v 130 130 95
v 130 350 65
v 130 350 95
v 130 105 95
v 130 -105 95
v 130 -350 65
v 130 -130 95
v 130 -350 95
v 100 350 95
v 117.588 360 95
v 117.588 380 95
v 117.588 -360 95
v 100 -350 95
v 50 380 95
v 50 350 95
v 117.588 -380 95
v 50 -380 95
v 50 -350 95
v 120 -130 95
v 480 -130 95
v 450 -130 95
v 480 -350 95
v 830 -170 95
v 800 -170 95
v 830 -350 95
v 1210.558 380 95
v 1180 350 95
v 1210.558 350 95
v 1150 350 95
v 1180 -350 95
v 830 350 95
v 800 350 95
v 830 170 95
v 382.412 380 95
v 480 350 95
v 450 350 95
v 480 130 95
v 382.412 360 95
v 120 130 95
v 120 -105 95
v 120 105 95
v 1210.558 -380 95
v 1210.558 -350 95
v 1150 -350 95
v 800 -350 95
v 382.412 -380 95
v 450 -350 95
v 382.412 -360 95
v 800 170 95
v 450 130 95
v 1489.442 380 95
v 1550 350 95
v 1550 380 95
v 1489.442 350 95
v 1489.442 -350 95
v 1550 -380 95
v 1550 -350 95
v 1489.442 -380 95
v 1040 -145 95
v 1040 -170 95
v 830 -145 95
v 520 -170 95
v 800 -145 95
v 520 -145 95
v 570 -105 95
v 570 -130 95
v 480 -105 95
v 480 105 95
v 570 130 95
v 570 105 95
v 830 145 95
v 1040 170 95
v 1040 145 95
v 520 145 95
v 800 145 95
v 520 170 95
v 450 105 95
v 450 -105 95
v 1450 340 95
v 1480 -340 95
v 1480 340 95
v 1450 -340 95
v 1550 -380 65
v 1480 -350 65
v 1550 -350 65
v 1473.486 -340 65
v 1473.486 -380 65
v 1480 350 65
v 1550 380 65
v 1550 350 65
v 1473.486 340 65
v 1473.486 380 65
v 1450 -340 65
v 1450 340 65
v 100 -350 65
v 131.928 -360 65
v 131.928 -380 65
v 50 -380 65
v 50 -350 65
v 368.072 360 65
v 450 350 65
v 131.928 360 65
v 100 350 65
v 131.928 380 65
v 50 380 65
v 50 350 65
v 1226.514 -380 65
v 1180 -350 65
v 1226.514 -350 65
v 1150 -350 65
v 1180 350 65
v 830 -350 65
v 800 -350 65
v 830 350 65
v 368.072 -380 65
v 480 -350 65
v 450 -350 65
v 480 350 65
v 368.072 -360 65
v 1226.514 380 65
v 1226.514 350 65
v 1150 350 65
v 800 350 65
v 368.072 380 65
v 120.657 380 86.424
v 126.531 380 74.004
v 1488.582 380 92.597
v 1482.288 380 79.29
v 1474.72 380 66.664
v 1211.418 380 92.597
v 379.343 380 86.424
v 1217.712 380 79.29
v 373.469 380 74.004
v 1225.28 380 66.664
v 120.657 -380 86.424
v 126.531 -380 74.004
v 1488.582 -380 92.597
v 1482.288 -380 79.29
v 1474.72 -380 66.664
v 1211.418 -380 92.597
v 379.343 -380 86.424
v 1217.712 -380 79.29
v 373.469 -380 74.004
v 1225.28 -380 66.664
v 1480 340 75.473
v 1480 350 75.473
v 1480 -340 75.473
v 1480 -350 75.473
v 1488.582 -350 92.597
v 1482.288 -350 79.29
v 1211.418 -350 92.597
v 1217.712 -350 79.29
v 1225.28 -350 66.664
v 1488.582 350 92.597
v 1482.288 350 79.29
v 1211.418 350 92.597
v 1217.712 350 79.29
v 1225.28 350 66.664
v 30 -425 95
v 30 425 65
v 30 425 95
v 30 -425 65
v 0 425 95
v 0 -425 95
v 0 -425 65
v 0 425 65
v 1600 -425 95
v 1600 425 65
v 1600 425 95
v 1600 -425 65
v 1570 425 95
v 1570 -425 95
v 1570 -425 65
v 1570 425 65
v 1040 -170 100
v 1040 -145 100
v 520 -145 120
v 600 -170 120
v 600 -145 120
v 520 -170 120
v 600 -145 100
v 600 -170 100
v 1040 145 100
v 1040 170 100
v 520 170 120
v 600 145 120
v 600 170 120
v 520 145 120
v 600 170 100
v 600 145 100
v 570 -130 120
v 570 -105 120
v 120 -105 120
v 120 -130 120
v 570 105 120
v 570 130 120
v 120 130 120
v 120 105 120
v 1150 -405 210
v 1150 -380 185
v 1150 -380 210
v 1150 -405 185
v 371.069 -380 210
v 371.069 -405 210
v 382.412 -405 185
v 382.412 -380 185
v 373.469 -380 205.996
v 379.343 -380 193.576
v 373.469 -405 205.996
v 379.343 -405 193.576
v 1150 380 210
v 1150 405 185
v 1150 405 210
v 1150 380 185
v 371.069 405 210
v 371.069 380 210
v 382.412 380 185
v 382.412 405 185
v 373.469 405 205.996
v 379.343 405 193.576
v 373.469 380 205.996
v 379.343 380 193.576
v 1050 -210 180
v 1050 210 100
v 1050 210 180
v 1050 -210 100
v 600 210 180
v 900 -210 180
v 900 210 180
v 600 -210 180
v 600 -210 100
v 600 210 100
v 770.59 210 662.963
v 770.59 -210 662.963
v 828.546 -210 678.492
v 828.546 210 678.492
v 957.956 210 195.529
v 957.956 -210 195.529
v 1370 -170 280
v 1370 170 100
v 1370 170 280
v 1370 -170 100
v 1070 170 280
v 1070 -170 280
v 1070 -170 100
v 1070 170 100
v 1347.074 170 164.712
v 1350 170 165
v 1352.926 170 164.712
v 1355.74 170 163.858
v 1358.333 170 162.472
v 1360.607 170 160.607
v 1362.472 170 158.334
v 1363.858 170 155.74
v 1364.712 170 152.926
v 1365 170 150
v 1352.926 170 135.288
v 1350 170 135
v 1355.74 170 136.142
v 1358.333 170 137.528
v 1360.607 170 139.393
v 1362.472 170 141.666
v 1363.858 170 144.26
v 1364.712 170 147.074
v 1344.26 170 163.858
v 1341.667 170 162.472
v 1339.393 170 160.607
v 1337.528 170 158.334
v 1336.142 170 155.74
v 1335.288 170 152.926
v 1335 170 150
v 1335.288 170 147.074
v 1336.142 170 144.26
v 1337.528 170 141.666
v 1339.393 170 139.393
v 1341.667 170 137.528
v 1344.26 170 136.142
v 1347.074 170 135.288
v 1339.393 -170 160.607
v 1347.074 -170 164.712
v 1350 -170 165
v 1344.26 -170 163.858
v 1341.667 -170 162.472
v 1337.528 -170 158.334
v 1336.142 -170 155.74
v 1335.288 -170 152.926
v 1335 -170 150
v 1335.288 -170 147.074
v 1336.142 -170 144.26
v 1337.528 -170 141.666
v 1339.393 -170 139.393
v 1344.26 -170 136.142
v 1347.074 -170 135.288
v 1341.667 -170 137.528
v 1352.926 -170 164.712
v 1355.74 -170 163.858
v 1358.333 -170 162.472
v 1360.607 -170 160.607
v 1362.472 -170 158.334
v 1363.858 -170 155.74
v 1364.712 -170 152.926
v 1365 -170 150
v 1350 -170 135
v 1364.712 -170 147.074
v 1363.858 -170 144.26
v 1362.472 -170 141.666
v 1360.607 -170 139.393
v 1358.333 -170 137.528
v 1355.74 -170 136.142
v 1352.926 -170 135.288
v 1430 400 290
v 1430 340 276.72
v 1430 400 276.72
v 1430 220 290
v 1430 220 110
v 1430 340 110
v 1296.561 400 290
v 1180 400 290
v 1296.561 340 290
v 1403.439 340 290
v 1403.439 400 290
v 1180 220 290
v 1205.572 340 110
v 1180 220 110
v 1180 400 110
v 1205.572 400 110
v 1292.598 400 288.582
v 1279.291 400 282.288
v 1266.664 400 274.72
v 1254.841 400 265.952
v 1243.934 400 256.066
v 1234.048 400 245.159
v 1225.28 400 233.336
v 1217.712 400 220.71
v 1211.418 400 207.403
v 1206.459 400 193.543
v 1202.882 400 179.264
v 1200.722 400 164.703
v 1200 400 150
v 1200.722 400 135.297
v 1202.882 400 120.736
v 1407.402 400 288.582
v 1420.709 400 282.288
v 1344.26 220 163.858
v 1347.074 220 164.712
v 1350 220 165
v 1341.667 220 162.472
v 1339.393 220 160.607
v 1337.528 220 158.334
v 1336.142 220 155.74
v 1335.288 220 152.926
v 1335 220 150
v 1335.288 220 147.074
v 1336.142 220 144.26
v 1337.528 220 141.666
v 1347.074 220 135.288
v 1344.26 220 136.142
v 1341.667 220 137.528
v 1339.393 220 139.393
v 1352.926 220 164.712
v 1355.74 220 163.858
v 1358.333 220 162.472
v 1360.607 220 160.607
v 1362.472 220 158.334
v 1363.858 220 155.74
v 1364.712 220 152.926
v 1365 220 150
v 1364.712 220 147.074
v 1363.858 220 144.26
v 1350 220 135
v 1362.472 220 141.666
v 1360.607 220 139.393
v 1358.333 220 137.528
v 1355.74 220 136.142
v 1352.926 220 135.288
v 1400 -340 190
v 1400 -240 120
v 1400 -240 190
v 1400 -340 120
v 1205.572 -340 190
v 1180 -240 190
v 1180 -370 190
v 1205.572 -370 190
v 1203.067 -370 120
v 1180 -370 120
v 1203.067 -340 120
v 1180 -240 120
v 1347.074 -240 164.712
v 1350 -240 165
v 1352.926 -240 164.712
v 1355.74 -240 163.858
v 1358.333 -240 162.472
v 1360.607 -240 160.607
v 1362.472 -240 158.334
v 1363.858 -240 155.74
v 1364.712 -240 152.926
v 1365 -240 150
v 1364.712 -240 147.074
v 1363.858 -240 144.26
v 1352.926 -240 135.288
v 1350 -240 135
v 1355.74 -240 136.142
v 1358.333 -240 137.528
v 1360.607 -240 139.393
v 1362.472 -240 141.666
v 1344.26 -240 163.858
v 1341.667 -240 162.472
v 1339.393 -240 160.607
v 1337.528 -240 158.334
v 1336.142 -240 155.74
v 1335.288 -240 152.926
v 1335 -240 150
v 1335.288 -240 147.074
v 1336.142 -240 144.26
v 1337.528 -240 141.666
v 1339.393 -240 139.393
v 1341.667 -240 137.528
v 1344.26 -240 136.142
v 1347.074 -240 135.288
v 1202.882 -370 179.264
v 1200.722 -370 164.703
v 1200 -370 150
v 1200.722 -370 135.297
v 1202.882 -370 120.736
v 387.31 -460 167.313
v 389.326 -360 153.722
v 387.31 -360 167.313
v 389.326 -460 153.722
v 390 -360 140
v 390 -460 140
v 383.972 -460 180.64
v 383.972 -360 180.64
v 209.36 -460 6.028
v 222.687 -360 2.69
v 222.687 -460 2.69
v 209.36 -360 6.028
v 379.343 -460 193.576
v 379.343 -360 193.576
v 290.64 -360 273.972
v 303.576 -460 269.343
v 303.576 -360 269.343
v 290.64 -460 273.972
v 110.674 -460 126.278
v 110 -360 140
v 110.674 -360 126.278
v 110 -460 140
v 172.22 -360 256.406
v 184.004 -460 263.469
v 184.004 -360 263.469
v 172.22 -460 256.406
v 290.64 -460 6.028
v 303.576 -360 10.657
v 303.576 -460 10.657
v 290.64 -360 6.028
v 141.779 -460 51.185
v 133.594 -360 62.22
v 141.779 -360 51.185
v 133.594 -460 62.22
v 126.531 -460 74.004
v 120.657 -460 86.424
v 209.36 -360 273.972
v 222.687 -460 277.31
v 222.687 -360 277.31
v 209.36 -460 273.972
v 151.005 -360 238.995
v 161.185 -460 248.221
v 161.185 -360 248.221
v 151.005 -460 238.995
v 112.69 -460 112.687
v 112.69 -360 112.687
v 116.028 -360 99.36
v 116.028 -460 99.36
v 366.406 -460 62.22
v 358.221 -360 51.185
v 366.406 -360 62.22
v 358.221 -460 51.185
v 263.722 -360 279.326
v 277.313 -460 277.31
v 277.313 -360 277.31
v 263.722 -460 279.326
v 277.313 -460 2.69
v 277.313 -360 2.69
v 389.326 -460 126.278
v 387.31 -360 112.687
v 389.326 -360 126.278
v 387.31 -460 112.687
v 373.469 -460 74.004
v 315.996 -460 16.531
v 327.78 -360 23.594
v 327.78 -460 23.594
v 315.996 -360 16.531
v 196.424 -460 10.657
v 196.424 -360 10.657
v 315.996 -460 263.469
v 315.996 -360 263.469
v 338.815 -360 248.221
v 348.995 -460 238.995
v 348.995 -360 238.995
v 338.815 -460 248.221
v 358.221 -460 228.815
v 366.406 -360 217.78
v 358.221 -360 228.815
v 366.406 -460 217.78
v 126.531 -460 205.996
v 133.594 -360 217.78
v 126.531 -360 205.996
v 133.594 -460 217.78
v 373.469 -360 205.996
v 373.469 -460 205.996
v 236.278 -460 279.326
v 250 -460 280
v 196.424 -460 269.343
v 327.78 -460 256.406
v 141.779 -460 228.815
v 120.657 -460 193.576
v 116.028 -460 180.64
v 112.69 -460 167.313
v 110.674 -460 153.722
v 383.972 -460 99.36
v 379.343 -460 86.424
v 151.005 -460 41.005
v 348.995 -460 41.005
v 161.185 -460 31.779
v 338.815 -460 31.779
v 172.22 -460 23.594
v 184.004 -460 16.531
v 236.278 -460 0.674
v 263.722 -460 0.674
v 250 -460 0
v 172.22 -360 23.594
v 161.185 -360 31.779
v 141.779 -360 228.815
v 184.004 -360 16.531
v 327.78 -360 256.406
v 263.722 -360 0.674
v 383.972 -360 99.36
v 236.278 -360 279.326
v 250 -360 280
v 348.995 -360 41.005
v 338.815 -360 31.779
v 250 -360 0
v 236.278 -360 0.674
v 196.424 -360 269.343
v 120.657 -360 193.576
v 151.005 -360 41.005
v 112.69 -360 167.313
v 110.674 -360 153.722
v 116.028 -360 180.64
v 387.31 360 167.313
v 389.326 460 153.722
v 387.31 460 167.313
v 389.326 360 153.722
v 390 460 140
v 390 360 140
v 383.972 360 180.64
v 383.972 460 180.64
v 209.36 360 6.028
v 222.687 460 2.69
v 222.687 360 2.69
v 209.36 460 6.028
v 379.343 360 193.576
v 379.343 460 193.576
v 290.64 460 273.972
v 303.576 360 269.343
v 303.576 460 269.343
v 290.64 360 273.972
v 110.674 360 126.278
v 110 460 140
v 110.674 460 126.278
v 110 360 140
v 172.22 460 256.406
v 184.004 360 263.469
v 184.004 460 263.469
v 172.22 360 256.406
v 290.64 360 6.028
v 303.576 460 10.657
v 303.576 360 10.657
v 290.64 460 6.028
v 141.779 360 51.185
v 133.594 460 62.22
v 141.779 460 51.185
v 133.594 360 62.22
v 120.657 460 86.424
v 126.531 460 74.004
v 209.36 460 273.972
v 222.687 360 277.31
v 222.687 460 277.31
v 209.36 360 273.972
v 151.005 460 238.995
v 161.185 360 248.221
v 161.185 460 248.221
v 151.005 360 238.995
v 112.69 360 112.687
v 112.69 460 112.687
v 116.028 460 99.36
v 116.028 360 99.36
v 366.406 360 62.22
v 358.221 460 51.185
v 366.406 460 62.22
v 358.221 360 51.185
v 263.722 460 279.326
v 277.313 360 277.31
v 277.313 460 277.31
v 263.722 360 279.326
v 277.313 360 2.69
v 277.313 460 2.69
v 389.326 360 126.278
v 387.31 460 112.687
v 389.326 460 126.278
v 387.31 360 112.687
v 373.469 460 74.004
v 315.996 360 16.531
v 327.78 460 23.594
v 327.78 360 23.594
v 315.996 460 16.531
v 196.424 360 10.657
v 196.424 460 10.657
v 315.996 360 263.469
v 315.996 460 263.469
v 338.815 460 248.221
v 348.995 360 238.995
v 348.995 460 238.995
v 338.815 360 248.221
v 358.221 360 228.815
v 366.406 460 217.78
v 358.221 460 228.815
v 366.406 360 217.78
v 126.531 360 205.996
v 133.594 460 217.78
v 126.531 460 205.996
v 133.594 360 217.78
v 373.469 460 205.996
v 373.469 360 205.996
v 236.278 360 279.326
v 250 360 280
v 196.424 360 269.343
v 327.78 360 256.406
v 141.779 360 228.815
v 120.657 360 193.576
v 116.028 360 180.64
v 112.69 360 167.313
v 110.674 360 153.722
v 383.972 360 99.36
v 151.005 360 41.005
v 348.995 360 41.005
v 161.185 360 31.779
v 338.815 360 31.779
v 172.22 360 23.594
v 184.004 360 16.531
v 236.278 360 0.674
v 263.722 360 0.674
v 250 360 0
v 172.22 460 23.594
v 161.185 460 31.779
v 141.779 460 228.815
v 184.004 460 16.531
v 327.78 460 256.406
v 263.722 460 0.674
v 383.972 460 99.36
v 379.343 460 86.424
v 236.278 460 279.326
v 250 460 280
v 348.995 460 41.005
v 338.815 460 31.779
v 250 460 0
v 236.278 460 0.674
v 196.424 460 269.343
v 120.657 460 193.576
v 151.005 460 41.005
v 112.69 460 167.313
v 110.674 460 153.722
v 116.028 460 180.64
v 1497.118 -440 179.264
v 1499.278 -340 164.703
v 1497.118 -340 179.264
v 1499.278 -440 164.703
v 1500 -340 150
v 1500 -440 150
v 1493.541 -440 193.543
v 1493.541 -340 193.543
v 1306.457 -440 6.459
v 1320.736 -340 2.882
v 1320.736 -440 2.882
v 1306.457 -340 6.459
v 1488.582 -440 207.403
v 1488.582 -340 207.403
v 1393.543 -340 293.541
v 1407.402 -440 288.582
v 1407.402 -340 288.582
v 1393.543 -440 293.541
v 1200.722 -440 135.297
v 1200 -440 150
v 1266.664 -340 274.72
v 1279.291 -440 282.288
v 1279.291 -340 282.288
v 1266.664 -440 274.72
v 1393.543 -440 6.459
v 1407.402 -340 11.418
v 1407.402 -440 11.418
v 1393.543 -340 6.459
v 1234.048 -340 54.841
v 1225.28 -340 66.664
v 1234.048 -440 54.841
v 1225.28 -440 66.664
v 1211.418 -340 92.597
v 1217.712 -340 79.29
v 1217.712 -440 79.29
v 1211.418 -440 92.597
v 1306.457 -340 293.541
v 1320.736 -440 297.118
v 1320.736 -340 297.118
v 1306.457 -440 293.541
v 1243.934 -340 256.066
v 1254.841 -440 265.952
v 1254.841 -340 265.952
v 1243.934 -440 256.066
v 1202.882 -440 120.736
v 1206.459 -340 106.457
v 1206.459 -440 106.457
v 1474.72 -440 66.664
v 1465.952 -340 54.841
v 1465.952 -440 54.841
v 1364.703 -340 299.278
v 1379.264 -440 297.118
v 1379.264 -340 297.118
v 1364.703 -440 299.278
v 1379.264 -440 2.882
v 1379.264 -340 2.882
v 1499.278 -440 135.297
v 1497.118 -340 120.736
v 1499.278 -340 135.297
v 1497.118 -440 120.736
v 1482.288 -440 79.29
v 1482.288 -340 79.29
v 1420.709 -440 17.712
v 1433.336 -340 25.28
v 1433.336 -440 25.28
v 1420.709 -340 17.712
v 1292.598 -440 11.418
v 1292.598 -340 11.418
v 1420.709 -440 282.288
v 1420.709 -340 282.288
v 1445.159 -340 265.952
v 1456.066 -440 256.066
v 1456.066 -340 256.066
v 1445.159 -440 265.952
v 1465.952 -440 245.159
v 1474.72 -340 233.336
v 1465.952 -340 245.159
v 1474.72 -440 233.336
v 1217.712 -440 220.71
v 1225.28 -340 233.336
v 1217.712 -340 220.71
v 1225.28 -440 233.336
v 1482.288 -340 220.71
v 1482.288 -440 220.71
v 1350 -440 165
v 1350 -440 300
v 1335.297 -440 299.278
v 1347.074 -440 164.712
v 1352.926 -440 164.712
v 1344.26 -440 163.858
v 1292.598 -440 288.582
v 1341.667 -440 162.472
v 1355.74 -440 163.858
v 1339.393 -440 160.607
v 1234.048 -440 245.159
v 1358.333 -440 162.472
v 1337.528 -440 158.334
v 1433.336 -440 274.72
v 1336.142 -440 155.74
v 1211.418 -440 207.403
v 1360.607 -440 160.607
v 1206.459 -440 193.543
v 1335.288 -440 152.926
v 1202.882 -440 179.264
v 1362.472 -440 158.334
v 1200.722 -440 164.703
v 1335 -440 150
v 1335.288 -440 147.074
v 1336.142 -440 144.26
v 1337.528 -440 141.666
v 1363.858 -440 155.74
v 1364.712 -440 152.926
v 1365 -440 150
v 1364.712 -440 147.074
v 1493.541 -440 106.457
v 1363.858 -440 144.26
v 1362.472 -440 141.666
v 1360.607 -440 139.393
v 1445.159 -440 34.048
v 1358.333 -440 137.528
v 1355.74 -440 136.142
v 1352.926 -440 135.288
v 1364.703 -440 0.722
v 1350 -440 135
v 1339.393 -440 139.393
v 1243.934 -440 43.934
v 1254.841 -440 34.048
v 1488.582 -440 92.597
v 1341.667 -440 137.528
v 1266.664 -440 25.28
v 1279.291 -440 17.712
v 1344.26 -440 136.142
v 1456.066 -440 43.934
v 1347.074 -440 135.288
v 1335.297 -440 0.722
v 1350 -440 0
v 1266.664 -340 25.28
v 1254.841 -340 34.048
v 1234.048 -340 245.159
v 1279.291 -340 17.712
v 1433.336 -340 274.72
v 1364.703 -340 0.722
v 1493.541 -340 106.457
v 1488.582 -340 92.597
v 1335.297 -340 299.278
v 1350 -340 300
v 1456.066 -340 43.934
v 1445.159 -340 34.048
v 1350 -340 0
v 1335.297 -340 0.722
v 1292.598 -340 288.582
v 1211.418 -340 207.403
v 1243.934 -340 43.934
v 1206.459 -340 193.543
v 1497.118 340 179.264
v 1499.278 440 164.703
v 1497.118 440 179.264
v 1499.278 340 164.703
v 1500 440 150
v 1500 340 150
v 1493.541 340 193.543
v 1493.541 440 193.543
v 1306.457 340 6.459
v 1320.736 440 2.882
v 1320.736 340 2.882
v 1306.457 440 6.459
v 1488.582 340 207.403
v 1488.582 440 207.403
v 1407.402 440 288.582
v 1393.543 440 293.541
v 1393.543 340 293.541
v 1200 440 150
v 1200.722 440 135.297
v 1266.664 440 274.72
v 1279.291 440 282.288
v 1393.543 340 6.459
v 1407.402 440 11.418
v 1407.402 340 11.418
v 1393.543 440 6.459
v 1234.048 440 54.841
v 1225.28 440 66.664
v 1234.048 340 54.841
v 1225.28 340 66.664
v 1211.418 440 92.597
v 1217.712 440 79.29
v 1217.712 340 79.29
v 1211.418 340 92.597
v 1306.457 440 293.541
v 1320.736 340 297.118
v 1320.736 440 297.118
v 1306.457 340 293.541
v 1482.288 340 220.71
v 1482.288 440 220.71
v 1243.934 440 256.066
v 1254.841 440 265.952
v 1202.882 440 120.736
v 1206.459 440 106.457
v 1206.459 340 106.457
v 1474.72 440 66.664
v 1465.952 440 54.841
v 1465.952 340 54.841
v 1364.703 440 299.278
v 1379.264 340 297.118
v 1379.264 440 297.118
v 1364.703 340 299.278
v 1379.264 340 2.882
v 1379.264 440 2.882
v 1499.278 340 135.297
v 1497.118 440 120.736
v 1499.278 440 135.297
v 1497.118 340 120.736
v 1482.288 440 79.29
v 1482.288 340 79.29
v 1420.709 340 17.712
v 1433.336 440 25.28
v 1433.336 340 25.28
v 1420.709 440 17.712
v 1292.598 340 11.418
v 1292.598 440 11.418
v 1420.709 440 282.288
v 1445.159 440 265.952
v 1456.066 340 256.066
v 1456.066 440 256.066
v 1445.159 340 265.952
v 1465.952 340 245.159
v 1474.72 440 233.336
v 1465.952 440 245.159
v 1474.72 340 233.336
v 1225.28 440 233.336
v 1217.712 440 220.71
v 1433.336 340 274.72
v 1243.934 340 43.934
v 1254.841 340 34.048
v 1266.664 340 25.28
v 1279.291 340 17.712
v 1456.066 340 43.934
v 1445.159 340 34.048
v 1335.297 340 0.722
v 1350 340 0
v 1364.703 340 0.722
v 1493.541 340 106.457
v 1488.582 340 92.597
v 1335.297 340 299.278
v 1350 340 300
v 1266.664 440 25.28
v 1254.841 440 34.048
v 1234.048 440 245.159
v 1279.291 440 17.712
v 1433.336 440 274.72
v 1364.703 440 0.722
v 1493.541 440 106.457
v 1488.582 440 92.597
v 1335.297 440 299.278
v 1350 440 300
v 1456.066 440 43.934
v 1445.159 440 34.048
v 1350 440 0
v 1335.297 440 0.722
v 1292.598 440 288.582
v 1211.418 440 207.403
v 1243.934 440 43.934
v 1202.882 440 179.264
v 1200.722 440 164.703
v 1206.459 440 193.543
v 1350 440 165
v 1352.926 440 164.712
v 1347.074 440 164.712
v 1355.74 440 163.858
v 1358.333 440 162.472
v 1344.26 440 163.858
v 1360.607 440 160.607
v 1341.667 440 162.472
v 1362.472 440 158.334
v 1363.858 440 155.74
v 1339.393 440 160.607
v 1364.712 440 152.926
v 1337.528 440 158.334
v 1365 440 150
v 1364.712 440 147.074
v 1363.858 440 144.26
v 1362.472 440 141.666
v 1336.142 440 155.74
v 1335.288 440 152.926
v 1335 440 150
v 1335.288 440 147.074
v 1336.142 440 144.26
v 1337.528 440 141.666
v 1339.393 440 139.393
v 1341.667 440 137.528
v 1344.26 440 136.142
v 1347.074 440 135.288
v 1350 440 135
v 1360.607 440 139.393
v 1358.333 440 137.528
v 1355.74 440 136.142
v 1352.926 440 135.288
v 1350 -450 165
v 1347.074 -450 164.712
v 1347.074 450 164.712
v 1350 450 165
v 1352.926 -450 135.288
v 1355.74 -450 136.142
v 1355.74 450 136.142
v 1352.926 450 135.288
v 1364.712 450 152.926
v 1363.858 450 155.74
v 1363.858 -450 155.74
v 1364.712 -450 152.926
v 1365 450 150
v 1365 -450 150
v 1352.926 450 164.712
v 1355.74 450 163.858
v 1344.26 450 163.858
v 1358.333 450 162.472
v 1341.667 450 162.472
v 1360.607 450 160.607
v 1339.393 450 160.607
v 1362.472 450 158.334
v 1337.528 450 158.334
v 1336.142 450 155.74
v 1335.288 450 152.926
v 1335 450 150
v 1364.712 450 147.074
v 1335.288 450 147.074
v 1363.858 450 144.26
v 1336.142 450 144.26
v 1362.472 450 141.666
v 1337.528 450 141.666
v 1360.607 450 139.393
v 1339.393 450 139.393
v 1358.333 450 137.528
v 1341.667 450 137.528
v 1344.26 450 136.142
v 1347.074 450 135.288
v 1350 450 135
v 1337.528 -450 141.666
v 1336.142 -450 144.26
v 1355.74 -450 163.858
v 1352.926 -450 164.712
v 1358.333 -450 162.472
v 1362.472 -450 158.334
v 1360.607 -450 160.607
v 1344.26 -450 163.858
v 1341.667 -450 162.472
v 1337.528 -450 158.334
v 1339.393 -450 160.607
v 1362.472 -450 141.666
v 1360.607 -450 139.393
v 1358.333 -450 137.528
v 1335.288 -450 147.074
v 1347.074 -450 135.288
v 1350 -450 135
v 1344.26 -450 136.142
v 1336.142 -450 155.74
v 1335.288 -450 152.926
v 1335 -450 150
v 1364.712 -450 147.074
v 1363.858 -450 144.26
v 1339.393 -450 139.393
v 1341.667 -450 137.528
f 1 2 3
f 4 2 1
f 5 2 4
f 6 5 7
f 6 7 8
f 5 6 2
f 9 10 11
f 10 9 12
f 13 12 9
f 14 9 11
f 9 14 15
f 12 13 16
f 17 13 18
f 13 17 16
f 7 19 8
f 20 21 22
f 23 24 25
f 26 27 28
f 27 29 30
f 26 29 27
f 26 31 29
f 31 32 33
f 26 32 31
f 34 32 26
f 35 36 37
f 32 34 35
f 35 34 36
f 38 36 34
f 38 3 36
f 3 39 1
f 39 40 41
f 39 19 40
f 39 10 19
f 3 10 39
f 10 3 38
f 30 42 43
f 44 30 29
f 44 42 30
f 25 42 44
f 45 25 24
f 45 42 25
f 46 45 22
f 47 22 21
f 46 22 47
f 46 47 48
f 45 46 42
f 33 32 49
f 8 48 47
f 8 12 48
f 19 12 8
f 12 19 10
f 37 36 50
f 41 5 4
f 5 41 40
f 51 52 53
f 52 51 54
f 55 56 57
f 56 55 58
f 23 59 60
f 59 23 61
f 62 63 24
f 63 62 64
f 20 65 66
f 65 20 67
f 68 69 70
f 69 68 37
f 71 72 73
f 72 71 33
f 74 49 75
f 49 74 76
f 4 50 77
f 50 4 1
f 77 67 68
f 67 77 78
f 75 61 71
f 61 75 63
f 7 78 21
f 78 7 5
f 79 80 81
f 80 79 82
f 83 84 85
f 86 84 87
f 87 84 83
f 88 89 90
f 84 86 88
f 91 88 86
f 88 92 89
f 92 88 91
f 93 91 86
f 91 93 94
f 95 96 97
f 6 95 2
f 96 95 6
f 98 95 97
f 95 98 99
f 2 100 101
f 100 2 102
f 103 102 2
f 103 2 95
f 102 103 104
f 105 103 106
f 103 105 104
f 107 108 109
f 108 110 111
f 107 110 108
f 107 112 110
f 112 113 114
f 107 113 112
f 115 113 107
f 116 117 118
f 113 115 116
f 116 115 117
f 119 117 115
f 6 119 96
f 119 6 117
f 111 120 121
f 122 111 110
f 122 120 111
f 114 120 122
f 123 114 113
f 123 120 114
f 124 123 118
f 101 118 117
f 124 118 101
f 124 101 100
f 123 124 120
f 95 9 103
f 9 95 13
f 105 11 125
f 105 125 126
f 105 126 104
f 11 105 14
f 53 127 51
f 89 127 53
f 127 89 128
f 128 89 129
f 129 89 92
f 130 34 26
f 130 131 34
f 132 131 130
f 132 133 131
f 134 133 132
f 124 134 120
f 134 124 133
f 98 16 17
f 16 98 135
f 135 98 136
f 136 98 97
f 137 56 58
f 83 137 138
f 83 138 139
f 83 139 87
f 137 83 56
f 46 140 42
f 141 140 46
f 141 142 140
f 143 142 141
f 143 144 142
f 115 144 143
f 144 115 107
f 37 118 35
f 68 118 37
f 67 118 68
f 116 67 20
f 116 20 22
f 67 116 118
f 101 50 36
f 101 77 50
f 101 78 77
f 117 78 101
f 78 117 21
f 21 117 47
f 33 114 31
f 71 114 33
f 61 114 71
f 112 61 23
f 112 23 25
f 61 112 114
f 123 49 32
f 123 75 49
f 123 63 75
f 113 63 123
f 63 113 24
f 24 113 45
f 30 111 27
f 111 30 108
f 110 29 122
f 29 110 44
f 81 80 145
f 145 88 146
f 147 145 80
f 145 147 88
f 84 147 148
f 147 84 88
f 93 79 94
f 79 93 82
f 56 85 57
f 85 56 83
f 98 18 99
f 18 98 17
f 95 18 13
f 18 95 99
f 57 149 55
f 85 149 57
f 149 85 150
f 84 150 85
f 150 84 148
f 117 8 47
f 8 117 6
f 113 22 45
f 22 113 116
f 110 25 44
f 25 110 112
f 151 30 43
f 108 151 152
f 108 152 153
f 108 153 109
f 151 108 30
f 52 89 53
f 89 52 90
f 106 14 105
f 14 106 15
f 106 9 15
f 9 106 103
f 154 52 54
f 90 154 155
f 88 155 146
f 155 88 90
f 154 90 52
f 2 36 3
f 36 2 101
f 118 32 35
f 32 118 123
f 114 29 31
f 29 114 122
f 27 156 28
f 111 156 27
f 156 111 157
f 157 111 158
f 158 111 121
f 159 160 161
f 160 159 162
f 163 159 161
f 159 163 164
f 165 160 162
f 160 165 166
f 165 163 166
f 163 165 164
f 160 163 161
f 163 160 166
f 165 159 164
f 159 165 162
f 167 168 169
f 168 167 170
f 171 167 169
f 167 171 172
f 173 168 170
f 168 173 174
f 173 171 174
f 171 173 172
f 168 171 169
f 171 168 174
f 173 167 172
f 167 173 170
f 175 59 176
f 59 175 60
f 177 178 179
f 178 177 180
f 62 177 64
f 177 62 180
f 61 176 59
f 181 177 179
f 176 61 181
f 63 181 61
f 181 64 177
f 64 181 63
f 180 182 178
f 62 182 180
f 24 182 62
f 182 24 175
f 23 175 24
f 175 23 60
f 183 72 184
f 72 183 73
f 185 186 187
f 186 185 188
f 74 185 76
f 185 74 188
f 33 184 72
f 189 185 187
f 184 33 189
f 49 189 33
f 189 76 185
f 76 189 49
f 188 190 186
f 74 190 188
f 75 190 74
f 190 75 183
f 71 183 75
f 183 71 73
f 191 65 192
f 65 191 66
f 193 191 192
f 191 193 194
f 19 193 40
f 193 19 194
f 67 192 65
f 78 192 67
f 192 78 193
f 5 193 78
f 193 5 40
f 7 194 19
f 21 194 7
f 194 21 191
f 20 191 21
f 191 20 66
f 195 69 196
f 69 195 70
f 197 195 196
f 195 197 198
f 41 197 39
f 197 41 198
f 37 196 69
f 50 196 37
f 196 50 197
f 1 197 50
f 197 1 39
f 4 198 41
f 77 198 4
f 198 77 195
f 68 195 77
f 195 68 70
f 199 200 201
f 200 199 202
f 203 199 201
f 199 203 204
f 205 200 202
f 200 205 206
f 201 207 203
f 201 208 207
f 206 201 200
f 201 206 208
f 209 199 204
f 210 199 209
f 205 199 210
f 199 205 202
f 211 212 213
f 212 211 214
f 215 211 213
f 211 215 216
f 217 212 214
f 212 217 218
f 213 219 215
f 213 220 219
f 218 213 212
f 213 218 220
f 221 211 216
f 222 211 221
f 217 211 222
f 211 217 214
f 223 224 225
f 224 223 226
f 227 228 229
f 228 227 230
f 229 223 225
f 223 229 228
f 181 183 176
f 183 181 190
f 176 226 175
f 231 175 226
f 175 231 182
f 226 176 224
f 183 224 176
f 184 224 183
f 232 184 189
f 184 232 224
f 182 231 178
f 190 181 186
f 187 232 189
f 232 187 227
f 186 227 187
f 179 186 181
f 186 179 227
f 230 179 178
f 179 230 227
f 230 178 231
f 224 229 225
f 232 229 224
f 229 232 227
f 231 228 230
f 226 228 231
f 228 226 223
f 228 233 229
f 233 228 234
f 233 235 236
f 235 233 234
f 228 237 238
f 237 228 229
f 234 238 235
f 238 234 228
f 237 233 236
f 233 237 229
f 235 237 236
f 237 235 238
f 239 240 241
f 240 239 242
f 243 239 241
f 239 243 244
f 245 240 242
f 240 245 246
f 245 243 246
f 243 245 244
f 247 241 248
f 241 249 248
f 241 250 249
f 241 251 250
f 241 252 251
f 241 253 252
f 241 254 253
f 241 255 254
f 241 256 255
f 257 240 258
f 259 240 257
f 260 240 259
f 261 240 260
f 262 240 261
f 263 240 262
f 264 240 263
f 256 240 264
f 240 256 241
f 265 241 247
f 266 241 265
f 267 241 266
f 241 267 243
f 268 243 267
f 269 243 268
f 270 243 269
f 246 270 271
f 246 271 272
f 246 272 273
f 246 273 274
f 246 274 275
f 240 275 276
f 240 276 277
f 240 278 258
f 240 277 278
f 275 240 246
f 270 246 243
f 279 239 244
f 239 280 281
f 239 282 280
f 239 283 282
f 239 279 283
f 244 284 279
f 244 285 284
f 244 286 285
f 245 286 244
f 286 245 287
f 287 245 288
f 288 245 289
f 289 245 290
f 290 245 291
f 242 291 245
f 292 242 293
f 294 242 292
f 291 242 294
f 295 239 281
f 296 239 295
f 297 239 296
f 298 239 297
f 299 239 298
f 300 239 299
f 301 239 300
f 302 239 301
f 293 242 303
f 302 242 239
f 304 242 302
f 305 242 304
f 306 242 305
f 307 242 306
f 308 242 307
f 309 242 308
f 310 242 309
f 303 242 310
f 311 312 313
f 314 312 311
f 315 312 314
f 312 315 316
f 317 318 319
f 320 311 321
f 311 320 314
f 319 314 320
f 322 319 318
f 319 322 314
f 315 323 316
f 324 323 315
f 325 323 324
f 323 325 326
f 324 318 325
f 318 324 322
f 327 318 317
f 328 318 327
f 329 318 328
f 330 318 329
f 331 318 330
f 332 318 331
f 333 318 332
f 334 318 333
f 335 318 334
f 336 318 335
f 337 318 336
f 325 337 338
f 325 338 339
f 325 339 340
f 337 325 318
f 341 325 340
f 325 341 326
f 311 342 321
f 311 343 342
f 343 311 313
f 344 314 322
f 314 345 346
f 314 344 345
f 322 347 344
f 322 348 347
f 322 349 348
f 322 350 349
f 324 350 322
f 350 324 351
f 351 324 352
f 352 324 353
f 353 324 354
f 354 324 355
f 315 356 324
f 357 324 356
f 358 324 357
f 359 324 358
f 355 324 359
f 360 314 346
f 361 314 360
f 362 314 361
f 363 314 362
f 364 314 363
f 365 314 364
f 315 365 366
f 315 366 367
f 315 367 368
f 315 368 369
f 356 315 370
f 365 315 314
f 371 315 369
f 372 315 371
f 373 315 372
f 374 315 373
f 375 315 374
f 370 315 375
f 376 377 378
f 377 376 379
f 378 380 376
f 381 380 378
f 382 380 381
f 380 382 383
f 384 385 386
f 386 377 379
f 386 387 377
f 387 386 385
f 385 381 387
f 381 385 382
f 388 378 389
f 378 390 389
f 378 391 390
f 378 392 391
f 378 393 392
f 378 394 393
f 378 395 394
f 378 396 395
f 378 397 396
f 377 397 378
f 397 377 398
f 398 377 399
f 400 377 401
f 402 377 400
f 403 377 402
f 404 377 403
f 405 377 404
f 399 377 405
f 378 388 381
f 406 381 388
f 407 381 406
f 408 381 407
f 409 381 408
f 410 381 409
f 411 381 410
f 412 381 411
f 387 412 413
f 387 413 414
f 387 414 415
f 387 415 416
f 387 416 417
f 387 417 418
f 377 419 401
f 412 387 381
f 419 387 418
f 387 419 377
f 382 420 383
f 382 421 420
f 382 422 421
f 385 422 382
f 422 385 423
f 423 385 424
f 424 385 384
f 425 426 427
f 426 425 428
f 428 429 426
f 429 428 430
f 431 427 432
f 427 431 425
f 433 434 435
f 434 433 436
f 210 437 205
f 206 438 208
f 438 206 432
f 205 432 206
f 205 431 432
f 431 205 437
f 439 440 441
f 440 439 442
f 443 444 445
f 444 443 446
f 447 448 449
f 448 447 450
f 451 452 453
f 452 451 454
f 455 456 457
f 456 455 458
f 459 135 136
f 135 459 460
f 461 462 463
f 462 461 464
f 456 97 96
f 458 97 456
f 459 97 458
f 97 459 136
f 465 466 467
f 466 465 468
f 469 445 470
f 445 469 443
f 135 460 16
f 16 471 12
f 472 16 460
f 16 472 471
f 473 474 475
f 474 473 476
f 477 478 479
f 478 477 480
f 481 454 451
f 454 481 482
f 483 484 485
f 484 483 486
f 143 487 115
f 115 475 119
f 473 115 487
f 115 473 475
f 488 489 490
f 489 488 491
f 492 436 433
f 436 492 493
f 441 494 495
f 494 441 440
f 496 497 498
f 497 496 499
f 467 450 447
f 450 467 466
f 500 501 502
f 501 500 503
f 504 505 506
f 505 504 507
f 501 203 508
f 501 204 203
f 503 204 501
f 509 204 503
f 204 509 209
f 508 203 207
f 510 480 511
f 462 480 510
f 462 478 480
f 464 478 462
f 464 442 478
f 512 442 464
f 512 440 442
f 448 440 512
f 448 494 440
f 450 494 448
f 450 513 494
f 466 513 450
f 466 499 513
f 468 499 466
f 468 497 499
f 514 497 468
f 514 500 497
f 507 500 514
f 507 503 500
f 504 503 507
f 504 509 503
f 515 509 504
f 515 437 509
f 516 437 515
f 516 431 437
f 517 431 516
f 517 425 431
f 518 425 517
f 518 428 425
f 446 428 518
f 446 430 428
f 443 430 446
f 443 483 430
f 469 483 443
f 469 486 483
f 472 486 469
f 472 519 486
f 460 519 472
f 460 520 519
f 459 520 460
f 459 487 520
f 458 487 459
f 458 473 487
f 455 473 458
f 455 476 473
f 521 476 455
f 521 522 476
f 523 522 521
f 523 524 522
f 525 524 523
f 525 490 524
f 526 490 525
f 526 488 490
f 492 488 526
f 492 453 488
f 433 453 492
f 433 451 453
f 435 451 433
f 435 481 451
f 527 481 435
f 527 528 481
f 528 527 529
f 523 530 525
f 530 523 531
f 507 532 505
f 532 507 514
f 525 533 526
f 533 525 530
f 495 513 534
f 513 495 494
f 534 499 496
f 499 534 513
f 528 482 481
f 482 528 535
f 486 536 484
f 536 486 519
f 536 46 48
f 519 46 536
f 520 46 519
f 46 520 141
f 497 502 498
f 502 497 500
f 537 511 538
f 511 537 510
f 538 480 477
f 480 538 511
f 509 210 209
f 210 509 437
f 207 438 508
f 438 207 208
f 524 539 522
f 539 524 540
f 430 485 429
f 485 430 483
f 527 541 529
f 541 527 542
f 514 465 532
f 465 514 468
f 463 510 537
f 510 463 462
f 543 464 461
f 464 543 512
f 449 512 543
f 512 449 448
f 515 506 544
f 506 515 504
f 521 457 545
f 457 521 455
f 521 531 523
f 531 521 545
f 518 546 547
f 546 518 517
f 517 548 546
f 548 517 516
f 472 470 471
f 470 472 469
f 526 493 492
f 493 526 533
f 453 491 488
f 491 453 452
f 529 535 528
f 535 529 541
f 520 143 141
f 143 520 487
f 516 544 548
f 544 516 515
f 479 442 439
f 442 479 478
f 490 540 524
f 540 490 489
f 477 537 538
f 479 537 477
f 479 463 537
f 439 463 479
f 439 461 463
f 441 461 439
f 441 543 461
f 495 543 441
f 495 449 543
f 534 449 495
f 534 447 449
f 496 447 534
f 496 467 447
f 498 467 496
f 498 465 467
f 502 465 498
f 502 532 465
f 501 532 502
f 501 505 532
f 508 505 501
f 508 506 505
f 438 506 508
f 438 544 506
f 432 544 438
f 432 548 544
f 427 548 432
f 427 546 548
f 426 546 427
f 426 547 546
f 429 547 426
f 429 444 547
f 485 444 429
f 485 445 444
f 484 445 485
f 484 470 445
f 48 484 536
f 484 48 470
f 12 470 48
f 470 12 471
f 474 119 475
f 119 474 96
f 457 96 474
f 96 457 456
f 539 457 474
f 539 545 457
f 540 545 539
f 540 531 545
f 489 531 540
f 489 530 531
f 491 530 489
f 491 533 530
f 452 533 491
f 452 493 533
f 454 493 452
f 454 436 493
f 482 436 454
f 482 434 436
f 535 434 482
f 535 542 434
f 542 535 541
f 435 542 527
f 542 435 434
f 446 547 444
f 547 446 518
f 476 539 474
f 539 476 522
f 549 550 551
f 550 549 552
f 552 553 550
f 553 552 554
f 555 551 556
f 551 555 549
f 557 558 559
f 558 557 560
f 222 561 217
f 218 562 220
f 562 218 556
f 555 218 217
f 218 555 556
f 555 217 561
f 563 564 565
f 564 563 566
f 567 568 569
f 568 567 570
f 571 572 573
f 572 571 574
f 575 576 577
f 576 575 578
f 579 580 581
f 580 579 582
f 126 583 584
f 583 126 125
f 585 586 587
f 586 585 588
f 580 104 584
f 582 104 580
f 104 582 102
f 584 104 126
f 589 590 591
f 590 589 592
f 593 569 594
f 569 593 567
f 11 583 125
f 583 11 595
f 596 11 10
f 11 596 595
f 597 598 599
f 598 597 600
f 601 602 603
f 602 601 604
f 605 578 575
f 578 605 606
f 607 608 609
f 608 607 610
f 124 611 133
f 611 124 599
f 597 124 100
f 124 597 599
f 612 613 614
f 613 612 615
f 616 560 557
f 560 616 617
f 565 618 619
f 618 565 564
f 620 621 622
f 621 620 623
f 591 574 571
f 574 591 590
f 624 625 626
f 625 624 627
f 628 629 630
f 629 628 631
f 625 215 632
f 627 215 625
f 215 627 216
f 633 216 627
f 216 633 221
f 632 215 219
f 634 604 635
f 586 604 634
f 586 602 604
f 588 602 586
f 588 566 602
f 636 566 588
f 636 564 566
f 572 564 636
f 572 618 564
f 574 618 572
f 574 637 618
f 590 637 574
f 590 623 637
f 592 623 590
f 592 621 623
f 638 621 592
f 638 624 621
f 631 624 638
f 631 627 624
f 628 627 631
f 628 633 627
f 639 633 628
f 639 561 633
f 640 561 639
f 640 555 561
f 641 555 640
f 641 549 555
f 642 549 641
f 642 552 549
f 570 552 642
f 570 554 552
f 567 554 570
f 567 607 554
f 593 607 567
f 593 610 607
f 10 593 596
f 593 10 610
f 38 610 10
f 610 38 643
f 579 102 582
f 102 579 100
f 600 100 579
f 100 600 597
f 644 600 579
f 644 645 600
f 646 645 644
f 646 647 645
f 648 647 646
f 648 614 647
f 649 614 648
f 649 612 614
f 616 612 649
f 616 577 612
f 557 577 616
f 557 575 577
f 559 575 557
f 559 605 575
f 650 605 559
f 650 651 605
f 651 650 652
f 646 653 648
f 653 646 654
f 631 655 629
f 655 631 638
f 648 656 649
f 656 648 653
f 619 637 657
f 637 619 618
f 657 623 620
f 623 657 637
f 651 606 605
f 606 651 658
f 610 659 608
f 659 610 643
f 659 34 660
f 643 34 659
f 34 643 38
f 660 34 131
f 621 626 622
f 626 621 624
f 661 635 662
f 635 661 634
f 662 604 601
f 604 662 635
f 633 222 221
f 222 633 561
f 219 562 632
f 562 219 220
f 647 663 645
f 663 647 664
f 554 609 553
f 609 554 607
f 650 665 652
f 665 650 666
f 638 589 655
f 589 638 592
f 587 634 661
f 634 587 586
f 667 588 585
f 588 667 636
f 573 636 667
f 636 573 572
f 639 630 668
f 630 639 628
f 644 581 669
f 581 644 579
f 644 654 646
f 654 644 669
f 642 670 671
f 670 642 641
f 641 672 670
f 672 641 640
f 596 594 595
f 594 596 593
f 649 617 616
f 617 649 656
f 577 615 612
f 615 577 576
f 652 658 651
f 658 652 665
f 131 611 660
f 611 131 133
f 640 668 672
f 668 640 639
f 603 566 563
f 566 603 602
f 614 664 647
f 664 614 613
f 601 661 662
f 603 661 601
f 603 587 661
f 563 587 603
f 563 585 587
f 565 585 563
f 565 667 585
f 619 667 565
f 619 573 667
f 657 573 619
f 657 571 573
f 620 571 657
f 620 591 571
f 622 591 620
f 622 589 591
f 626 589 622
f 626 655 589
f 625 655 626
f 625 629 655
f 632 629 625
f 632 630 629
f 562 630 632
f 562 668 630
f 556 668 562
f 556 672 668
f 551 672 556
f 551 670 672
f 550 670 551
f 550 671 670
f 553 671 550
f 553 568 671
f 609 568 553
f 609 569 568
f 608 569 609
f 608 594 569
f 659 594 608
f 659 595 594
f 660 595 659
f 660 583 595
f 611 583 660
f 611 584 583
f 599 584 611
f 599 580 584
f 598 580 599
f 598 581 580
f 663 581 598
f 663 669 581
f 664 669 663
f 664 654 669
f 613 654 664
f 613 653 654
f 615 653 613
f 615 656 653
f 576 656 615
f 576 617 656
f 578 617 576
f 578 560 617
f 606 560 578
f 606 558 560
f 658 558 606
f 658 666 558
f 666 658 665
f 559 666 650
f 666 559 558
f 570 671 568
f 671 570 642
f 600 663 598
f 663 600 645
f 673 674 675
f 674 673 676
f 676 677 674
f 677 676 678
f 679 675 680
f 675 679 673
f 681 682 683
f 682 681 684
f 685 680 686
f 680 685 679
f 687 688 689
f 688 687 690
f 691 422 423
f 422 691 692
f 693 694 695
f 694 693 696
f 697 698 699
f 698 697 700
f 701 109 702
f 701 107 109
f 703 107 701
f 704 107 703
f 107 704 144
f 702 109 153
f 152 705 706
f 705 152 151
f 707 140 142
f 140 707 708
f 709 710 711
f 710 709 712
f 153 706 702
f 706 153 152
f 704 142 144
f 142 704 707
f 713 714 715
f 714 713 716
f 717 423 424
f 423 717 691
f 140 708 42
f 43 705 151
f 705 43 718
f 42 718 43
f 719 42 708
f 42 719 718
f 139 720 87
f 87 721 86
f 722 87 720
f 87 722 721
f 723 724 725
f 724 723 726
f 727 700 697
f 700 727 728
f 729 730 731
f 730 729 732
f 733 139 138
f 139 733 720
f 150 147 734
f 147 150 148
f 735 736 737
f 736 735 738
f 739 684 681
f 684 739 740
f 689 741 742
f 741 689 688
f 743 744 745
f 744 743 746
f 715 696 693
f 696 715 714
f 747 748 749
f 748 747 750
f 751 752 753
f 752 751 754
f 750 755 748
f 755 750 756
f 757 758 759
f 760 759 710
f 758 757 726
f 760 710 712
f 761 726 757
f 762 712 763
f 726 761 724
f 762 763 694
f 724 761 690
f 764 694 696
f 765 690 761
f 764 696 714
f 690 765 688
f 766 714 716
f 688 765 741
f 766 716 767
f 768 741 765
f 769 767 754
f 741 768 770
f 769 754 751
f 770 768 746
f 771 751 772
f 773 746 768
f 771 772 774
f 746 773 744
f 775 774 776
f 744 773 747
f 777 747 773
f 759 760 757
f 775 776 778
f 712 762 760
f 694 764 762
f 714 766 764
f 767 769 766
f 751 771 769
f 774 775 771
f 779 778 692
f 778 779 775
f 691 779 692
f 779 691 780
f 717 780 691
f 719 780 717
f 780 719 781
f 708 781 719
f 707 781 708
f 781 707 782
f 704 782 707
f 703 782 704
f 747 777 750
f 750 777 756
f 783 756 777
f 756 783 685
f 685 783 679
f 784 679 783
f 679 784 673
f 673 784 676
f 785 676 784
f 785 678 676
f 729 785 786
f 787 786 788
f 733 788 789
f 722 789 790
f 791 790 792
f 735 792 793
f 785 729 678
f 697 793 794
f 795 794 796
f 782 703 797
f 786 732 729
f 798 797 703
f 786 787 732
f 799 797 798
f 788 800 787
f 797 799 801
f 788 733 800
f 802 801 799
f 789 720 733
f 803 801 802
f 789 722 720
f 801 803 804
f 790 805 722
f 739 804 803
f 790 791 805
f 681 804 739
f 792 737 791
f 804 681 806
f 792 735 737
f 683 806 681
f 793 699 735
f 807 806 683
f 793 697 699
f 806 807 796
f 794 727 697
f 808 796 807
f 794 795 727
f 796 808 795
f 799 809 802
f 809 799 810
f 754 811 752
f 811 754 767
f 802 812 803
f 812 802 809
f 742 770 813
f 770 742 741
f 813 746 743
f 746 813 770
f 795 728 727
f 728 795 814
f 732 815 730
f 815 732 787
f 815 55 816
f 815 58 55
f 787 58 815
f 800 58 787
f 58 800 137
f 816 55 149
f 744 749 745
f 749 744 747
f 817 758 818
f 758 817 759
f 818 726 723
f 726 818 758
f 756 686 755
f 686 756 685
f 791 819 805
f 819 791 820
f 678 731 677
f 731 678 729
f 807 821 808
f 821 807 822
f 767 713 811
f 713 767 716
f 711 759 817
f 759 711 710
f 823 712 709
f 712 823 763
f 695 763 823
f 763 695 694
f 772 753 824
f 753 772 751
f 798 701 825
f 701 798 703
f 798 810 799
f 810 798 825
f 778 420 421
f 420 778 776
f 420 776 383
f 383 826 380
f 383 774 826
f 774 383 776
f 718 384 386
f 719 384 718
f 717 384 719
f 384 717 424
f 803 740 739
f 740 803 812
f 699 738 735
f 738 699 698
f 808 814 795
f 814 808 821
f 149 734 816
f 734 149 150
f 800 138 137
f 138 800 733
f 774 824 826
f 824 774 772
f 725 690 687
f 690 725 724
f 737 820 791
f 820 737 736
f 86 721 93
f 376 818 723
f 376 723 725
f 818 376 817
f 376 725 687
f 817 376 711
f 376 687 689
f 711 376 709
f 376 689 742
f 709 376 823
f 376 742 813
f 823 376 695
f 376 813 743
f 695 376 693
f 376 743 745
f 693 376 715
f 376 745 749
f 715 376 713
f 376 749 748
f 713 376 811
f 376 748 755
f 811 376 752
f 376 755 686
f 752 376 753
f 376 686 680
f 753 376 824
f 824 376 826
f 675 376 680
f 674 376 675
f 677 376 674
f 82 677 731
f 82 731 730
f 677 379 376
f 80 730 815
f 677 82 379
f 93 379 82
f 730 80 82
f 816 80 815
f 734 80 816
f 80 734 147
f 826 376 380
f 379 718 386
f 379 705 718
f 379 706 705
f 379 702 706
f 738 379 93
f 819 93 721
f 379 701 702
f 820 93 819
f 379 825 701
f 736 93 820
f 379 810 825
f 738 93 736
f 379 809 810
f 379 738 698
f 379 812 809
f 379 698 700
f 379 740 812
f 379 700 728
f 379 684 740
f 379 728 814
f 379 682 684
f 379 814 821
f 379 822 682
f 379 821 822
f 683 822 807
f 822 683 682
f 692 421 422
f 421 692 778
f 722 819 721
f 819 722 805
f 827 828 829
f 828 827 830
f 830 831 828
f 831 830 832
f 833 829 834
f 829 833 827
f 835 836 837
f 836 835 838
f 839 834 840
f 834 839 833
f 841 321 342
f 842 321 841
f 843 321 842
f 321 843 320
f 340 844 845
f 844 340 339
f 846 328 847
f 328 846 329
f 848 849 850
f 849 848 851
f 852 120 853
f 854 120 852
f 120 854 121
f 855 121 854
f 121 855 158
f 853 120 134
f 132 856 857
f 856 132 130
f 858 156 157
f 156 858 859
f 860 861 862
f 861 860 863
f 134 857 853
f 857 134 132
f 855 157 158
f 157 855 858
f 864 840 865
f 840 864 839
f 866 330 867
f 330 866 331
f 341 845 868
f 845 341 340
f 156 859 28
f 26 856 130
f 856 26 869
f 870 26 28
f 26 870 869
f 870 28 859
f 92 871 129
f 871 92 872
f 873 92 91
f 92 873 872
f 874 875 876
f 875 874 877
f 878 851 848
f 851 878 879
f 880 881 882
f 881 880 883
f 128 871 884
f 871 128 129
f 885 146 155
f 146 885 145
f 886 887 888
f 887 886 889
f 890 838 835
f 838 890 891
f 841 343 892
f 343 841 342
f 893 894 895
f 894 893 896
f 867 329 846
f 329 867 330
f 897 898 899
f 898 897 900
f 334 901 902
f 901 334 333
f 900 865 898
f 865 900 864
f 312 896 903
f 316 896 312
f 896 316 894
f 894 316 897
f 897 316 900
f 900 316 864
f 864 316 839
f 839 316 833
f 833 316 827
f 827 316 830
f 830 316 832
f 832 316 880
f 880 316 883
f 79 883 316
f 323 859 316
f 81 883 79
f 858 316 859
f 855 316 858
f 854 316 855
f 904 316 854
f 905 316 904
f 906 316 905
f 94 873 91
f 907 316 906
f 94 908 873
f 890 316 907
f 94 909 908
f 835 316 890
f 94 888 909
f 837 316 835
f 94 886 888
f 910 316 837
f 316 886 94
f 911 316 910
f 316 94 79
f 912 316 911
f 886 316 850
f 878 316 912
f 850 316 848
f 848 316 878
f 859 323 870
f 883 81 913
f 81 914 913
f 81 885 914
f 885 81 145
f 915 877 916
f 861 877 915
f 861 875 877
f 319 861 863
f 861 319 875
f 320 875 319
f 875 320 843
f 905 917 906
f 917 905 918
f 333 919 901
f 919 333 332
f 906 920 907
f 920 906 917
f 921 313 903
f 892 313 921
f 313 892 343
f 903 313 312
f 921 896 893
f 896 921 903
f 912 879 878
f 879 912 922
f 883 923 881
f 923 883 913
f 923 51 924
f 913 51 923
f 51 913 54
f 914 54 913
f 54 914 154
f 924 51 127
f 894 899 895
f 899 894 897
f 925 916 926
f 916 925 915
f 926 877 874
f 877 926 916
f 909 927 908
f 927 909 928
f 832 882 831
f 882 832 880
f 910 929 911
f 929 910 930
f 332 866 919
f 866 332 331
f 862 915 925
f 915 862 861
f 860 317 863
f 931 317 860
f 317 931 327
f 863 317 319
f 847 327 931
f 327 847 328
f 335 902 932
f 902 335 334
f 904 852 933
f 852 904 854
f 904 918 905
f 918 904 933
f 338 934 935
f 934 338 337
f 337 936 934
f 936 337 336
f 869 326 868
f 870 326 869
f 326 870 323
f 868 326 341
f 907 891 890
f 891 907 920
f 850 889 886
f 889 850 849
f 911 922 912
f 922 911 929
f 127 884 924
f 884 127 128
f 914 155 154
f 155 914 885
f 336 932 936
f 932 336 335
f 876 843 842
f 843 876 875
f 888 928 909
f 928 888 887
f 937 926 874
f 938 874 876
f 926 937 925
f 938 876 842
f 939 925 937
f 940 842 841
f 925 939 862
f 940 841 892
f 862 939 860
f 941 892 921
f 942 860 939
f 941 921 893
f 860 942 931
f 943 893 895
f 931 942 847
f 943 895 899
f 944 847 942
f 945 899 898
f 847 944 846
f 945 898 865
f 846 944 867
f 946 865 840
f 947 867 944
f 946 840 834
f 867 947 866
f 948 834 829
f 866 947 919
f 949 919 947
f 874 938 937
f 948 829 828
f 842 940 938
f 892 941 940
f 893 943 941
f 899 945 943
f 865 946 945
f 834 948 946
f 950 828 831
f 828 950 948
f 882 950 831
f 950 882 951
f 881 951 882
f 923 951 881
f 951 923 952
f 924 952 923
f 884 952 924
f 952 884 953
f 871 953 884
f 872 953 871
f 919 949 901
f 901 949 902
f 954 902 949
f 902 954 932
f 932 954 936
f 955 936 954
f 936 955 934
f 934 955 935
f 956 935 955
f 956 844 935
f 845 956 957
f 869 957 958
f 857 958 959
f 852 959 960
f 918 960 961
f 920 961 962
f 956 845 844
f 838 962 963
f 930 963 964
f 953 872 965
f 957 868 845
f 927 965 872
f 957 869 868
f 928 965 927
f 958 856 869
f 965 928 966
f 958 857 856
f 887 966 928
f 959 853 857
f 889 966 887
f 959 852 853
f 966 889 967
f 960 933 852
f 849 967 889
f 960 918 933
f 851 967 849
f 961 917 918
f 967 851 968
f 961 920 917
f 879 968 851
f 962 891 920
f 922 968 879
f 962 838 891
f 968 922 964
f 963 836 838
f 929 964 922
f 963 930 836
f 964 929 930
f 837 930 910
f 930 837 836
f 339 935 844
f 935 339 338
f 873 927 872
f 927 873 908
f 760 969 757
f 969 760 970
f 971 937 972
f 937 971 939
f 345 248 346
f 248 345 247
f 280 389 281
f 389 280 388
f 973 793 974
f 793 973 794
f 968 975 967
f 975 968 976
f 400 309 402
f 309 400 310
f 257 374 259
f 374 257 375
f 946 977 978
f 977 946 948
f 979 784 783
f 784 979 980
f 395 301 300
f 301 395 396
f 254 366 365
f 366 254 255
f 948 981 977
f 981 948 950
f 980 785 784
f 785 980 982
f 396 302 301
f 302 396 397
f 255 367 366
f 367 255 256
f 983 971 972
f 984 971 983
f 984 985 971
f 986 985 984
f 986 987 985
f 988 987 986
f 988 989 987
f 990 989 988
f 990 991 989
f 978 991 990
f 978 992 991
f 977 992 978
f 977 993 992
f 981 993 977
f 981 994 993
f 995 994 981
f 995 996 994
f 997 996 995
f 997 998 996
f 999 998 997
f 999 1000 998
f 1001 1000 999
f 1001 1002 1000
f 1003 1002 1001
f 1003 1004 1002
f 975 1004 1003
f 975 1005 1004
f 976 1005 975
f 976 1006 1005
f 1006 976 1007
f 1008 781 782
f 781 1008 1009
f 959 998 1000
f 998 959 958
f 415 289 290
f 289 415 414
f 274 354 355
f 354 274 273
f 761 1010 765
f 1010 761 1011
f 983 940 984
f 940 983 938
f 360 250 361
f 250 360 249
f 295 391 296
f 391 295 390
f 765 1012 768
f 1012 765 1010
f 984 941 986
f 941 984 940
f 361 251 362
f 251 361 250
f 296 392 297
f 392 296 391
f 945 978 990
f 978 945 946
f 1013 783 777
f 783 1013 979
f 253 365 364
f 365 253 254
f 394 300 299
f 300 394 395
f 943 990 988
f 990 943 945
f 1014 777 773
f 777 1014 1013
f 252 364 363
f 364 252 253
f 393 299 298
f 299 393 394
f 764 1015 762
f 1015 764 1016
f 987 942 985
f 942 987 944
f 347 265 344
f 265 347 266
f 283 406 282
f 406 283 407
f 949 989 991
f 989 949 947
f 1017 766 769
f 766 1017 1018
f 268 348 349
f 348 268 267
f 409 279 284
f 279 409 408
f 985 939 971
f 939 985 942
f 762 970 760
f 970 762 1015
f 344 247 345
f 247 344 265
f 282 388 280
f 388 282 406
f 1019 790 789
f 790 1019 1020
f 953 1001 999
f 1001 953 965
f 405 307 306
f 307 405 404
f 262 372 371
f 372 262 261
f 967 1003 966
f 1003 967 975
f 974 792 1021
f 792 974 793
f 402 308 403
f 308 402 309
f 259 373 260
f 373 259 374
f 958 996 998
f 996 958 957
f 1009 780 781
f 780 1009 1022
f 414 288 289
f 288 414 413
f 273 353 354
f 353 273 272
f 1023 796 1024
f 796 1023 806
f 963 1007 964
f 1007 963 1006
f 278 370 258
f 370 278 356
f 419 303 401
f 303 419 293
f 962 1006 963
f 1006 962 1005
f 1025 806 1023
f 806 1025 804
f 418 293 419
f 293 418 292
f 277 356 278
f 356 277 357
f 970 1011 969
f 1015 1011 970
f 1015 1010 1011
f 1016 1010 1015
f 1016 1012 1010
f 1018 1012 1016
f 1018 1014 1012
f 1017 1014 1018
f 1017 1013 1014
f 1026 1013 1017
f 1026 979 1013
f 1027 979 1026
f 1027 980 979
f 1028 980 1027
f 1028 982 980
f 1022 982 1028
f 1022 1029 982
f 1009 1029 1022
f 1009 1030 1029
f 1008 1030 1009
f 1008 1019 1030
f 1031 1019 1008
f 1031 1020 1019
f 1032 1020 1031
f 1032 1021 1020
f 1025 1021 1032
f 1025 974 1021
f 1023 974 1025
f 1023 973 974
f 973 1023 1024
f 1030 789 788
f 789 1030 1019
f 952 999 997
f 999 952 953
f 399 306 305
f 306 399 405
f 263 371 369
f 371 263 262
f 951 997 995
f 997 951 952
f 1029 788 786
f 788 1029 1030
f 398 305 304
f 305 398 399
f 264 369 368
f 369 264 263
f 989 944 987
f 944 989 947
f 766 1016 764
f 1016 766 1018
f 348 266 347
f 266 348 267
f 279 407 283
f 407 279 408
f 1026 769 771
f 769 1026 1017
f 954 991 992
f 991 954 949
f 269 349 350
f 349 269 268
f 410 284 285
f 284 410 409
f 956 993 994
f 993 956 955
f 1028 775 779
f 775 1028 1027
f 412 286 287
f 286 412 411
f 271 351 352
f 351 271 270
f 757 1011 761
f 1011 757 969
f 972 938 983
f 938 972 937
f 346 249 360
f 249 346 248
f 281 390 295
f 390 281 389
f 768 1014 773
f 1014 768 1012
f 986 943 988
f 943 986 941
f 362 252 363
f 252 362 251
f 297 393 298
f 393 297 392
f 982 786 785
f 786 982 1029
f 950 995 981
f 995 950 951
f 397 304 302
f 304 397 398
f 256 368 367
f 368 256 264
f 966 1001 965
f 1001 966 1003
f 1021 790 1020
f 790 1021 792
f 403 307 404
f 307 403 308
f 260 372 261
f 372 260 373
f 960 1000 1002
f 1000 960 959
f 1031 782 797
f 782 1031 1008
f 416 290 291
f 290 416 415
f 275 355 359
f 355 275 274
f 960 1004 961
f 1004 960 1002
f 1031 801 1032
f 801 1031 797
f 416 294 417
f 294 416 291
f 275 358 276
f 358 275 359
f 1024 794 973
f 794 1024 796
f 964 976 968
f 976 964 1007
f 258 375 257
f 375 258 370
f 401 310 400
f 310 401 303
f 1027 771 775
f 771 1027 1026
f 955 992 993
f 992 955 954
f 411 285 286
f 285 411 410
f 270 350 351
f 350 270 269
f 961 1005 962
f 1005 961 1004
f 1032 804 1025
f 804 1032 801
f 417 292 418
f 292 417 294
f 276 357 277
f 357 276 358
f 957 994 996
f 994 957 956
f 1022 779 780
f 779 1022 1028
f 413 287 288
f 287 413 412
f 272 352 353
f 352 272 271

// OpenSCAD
// Parametric concept model. Dimensions in mm.
// Update from calculations/defaults.json after measuring actual wheels.

frame_length = 1600;
frame_width = 760;
wheelbase = 1100;
front_track = 820;
rear_track = 780;
rear_wheel_d = 300;
front_wheel_d = 280;
wheel_width = 100;
ground_clearance = 65;
main_tube = 30;
secondary_tube = 25;

module beam_x(x, y, z, len, size=main_tube) {
    translate([x, y, z]) cube([len, size, size]);
}
module beam_y(x, y, z, len, size=main_tube) {
    translate([x, y, z]) cube([size, len, size]);
}
module wheel(x, y, z, d, width) {
    translate([x, y, z]) rotate([90,0,0]) cylinder(d=d, h=width, center=true, $fn=64);
}

module frame() {
    z = ground_clearance;
    beam_x(50, -frame_width/2, z, frame_length-100);
    beam_x(50, frame_width/2-main_tube, z, frame_length-100);
    for (x=[100, 450, 800, 1150, 1450])
        beam_y(x, -frame_width/2, z, frame_width);
    beam_y(0, -425, z, 850);
    beam_y(frame_length-main_tube, -425, z, 850);

    // seat rails
    beam_x(520, -170, z+main_tube, 520, secondary_tube);
    beam_x(520, 145, z+main_tube, 520, secondary_tube);
    // pedal rails
    beam_x(120, -130, z+main_tube, 450, secondary_tube);
    beam_x(120, 105, z+main_tube, 450, secondary_tube);
    // side rails
    beam_x(350, -frame_width/2-25, z+120, 800, secondary_tube);
    beam_x(350, frame_width/2, z+120, 800, secondary_tube);
}

module placeholders() {
    // seat
    color("blue") translate([600,-210,100]) cube([450,420,80]);
    color("blue") translate([900,-210,180]) rotate([0,-15,0]) cube([60,420,500]);
    // battery centred behind seat
    color("green") translate([1070,-170,100]) cube([300,340,180]);
    // motor at right rear
    color("orange") translate([1180,220,110]) cube([250,180,180]);
    // controller at left rear
    color("red") translate([1180,-370,120]) cube([220,130,70]);
}

module running_gear() {
    front_x = 250;
    rear_x = front_x + wheelbase;
    zf = front_wheel_d/2;
    zr = rear_wheel_d/2;
    color("black") wheel(front_x, -front_track/2, zf, front_wheel_d, wheel_width);
    color("black") wheel(front_x, front_track/2, zf, front_wheel_d, wheel_width);
    color("black") wheel(rear_x, -rear_track/2, zr, rear_wheel_d, wheel_width);
    color("black") wheel(rear_x, rear_track/2, zr, rear_wheel_d, wheel_width);
    color("silver") translate([rear_x,0,zr]) rotate([90,0,0]) cylinder(d=30,h=rear_track+120,center=true,$fn=32);
}

frame();
placeholders();
running_gear();
